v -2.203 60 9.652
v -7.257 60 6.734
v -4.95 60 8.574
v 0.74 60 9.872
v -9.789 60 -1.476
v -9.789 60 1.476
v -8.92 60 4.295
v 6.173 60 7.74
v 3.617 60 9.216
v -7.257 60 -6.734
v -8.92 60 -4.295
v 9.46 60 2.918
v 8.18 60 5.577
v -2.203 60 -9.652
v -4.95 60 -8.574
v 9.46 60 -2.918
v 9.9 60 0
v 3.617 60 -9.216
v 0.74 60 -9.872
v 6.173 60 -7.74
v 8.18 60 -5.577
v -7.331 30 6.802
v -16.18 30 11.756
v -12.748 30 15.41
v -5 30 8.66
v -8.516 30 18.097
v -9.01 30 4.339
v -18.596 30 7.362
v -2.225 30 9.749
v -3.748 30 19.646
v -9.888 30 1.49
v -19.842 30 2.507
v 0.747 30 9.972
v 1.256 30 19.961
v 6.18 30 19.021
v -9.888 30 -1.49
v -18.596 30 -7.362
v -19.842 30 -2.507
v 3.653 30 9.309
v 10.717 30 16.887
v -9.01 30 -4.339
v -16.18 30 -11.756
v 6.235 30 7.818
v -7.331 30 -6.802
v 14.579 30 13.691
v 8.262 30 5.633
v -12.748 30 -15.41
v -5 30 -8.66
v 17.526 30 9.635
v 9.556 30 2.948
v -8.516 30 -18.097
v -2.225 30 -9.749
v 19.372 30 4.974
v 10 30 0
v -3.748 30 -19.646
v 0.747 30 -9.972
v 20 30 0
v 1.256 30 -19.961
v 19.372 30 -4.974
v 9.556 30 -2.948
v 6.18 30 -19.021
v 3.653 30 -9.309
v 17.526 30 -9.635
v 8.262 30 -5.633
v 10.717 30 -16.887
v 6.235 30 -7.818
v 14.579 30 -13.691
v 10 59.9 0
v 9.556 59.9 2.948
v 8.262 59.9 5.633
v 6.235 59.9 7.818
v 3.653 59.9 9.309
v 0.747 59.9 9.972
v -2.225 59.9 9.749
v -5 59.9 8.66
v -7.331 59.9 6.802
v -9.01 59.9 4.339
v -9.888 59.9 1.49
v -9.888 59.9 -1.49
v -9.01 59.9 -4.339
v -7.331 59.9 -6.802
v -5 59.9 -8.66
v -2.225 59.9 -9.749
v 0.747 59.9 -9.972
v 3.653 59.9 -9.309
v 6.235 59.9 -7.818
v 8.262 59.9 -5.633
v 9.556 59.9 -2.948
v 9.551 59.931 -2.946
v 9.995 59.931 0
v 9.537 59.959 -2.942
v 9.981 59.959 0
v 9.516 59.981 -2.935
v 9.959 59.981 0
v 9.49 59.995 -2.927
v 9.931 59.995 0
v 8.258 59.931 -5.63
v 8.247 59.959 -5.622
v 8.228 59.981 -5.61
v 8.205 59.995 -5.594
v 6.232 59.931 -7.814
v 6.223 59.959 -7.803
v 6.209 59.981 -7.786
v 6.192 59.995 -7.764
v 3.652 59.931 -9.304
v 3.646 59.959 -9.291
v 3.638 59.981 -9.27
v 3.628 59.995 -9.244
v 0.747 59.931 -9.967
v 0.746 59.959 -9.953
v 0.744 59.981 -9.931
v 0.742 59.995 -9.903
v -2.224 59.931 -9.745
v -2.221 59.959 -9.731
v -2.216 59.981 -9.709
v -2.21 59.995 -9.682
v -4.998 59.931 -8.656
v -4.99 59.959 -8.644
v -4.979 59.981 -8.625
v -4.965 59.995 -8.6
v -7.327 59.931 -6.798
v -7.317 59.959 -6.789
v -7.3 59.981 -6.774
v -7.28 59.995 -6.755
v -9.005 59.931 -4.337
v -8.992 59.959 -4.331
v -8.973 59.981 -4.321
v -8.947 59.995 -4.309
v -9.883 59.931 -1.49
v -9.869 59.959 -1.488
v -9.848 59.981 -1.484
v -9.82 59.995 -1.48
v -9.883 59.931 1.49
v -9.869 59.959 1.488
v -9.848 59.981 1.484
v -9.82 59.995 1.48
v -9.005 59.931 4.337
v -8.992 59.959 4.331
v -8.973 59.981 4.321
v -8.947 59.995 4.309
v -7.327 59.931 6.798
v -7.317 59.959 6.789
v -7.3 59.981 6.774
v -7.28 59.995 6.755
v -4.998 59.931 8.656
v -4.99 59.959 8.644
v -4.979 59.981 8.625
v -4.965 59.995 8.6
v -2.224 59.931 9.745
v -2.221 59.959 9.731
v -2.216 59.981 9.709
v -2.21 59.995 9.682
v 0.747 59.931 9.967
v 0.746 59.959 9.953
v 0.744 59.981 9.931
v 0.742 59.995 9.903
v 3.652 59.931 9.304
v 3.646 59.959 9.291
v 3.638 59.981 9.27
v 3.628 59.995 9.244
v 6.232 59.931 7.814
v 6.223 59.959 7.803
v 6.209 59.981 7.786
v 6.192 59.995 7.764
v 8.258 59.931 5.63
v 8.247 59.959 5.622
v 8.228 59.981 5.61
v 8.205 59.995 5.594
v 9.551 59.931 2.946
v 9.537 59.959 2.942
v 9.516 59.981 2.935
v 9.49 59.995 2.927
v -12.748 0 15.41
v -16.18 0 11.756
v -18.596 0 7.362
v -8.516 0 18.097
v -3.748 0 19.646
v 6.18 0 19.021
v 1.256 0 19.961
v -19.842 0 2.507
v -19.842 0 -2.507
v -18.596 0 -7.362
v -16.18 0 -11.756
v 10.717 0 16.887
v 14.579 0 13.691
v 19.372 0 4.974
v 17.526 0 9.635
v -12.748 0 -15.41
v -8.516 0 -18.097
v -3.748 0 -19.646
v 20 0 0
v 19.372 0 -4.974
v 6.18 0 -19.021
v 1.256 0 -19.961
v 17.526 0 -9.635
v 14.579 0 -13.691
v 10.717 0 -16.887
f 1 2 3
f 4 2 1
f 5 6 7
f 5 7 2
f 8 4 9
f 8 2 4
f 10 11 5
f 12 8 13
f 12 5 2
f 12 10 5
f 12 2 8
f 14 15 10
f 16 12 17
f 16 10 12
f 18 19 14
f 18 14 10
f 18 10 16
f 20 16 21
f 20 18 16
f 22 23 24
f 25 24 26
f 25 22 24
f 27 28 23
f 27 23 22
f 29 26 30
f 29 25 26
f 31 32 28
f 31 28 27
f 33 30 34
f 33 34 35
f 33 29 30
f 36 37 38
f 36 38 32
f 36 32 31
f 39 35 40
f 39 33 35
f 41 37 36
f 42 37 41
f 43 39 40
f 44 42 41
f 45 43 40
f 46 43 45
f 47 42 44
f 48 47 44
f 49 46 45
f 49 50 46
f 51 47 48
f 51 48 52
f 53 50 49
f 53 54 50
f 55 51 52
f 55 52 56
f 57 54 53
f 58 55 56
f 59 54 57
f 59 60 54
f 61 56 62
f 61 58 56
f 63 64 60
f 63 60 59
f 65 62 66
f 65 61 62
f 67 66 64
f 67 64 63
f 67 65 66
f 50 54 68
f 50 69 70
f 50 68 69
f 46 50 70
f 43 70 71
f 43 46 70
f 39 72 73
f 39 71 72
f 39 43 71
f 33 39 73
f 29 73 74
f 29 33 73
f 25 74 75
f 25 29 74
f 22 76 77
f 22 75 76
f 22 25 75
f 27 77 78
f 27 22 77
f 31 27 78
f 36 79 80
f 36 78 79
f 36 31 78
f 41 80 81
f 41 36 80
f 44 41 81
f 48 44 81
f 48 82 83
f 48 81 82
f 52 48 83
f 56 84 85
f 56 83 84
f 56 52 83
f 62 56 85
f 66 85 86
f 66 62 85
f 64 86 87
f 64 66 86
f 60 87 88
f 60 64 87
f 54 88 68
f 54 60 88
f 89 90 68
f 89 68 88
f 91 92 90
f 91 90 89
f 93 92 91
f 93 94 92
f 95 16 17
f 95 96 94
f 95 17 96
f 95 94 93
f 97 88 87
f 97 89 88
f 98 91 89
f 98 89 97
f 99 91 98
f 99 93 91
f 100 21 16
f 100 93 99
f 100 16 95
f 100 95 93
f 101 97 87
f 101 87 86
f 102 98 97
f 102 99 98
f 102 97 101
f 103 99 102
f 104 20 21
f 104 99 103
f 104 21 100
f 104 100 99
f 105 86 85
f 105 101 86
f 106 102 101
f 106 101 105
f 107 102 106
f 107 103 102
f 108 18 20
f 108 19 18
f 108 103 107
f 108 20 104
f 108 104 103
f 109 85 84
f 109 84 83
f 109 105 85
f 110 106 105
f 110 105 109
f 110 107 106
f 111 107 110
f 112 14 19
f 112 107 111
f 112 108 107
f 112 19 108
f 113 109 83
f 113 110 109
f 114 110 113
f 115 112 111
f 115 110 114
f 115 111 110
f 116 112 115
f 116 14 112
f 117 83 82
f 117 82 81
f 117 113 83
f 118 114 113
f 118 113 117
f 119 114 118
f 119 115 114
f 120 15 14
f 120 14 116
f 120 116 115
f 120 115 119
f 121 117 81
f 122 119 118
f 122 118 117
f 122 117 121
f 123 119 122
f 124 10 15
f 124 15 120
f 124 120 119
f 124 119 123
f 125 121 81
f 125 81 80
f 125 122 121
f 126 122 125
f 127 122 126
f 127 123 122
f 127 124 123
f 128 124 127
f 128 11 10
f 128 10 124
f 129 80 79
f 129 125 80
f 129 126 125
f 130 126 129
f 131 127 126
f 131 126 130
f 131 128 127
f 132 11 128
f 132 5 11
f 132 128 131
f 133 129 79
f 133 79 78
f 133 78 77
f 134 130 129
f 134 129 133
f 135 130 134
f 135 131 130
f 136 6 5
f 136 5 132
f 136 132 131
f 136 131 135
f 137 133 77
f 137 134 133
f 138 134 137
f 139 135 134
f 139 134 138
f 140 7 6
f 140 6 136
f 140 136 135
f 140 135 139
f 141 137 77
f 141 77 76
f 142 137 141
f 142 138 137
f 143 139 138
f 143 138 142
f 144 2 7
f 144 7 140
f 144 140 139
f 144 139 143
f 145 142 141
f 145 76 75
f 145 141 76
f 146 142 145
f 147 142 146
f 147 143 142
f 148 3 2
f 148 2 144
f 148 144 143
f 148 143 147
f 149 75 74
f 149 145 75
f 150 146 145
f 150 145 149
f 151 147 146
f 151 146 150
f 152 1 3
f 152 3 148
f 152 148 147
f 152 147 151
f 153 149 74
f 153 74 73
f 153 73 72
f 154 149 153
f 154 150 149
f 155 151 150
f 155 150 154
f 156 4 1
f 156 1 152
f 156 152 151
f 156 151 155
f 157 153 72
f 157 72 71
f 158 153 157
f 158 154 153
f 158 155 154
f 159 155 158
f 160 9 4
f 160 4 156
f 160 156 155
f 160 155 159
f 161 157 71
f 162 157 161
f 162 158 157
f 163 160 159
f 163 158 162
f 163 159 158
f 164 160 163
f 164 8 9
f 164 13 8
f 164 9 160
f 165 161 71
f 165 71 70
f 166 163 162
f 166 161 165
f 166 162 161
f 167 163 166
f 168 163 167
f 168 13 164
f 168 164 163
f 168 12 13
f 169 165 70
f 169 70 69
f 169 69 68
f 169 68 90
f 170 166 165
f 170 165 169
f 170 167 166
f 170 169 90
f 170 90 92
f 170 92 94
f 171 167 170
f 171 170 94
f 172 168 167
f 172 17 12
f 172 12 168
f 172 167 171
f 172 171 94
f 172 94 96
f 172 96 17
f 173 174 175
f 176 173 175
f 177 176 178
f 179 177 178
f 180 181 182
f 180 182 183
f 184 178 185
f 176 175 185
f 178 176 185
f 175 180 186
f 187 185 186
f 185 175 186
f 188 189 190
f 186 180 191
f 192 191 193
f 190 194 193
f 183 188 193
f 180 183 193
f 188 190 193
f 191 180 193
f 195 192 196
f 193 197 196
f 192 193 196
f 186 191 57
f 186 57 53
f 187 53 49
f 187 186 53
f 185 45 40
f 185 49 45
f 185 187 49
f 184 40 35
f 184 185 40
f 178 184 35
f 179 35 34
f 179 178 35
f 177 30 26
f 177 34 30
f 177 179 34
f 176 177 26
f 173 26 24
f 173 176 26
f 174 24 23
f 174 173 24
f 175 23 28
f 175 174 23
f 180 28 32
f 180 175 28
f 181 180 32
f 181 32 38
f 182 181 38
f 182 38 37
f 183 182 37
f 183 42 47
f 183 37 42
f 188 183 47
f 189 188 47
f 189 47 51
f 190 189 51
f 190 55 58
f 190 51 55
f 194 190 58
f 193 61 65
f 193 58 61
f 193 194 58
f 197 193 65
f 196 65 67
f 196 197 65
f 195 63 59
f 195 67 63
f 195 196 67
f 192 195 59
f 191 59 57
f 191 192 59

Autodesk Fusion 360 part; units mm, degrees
sketch "Sketch1" plane through (0, 0, 0) normal (0, 1, 0) x (1, 0, 0)
  circle A0 centre (0, 0) radius 20
  circle A1 centre (0, 0) radius 10
  dimension "d1" = 40
  dimension "d2" = 20
extrude "Extrude1" add sketch "Sketch1" along normal blind 30
extrude "Extrude2" add sketch "Sketch1" along normal blind 60 contours A1
fillet "Fillet1" radius 0.1 1 edges at (-9.3233, 60, 3.6162)
